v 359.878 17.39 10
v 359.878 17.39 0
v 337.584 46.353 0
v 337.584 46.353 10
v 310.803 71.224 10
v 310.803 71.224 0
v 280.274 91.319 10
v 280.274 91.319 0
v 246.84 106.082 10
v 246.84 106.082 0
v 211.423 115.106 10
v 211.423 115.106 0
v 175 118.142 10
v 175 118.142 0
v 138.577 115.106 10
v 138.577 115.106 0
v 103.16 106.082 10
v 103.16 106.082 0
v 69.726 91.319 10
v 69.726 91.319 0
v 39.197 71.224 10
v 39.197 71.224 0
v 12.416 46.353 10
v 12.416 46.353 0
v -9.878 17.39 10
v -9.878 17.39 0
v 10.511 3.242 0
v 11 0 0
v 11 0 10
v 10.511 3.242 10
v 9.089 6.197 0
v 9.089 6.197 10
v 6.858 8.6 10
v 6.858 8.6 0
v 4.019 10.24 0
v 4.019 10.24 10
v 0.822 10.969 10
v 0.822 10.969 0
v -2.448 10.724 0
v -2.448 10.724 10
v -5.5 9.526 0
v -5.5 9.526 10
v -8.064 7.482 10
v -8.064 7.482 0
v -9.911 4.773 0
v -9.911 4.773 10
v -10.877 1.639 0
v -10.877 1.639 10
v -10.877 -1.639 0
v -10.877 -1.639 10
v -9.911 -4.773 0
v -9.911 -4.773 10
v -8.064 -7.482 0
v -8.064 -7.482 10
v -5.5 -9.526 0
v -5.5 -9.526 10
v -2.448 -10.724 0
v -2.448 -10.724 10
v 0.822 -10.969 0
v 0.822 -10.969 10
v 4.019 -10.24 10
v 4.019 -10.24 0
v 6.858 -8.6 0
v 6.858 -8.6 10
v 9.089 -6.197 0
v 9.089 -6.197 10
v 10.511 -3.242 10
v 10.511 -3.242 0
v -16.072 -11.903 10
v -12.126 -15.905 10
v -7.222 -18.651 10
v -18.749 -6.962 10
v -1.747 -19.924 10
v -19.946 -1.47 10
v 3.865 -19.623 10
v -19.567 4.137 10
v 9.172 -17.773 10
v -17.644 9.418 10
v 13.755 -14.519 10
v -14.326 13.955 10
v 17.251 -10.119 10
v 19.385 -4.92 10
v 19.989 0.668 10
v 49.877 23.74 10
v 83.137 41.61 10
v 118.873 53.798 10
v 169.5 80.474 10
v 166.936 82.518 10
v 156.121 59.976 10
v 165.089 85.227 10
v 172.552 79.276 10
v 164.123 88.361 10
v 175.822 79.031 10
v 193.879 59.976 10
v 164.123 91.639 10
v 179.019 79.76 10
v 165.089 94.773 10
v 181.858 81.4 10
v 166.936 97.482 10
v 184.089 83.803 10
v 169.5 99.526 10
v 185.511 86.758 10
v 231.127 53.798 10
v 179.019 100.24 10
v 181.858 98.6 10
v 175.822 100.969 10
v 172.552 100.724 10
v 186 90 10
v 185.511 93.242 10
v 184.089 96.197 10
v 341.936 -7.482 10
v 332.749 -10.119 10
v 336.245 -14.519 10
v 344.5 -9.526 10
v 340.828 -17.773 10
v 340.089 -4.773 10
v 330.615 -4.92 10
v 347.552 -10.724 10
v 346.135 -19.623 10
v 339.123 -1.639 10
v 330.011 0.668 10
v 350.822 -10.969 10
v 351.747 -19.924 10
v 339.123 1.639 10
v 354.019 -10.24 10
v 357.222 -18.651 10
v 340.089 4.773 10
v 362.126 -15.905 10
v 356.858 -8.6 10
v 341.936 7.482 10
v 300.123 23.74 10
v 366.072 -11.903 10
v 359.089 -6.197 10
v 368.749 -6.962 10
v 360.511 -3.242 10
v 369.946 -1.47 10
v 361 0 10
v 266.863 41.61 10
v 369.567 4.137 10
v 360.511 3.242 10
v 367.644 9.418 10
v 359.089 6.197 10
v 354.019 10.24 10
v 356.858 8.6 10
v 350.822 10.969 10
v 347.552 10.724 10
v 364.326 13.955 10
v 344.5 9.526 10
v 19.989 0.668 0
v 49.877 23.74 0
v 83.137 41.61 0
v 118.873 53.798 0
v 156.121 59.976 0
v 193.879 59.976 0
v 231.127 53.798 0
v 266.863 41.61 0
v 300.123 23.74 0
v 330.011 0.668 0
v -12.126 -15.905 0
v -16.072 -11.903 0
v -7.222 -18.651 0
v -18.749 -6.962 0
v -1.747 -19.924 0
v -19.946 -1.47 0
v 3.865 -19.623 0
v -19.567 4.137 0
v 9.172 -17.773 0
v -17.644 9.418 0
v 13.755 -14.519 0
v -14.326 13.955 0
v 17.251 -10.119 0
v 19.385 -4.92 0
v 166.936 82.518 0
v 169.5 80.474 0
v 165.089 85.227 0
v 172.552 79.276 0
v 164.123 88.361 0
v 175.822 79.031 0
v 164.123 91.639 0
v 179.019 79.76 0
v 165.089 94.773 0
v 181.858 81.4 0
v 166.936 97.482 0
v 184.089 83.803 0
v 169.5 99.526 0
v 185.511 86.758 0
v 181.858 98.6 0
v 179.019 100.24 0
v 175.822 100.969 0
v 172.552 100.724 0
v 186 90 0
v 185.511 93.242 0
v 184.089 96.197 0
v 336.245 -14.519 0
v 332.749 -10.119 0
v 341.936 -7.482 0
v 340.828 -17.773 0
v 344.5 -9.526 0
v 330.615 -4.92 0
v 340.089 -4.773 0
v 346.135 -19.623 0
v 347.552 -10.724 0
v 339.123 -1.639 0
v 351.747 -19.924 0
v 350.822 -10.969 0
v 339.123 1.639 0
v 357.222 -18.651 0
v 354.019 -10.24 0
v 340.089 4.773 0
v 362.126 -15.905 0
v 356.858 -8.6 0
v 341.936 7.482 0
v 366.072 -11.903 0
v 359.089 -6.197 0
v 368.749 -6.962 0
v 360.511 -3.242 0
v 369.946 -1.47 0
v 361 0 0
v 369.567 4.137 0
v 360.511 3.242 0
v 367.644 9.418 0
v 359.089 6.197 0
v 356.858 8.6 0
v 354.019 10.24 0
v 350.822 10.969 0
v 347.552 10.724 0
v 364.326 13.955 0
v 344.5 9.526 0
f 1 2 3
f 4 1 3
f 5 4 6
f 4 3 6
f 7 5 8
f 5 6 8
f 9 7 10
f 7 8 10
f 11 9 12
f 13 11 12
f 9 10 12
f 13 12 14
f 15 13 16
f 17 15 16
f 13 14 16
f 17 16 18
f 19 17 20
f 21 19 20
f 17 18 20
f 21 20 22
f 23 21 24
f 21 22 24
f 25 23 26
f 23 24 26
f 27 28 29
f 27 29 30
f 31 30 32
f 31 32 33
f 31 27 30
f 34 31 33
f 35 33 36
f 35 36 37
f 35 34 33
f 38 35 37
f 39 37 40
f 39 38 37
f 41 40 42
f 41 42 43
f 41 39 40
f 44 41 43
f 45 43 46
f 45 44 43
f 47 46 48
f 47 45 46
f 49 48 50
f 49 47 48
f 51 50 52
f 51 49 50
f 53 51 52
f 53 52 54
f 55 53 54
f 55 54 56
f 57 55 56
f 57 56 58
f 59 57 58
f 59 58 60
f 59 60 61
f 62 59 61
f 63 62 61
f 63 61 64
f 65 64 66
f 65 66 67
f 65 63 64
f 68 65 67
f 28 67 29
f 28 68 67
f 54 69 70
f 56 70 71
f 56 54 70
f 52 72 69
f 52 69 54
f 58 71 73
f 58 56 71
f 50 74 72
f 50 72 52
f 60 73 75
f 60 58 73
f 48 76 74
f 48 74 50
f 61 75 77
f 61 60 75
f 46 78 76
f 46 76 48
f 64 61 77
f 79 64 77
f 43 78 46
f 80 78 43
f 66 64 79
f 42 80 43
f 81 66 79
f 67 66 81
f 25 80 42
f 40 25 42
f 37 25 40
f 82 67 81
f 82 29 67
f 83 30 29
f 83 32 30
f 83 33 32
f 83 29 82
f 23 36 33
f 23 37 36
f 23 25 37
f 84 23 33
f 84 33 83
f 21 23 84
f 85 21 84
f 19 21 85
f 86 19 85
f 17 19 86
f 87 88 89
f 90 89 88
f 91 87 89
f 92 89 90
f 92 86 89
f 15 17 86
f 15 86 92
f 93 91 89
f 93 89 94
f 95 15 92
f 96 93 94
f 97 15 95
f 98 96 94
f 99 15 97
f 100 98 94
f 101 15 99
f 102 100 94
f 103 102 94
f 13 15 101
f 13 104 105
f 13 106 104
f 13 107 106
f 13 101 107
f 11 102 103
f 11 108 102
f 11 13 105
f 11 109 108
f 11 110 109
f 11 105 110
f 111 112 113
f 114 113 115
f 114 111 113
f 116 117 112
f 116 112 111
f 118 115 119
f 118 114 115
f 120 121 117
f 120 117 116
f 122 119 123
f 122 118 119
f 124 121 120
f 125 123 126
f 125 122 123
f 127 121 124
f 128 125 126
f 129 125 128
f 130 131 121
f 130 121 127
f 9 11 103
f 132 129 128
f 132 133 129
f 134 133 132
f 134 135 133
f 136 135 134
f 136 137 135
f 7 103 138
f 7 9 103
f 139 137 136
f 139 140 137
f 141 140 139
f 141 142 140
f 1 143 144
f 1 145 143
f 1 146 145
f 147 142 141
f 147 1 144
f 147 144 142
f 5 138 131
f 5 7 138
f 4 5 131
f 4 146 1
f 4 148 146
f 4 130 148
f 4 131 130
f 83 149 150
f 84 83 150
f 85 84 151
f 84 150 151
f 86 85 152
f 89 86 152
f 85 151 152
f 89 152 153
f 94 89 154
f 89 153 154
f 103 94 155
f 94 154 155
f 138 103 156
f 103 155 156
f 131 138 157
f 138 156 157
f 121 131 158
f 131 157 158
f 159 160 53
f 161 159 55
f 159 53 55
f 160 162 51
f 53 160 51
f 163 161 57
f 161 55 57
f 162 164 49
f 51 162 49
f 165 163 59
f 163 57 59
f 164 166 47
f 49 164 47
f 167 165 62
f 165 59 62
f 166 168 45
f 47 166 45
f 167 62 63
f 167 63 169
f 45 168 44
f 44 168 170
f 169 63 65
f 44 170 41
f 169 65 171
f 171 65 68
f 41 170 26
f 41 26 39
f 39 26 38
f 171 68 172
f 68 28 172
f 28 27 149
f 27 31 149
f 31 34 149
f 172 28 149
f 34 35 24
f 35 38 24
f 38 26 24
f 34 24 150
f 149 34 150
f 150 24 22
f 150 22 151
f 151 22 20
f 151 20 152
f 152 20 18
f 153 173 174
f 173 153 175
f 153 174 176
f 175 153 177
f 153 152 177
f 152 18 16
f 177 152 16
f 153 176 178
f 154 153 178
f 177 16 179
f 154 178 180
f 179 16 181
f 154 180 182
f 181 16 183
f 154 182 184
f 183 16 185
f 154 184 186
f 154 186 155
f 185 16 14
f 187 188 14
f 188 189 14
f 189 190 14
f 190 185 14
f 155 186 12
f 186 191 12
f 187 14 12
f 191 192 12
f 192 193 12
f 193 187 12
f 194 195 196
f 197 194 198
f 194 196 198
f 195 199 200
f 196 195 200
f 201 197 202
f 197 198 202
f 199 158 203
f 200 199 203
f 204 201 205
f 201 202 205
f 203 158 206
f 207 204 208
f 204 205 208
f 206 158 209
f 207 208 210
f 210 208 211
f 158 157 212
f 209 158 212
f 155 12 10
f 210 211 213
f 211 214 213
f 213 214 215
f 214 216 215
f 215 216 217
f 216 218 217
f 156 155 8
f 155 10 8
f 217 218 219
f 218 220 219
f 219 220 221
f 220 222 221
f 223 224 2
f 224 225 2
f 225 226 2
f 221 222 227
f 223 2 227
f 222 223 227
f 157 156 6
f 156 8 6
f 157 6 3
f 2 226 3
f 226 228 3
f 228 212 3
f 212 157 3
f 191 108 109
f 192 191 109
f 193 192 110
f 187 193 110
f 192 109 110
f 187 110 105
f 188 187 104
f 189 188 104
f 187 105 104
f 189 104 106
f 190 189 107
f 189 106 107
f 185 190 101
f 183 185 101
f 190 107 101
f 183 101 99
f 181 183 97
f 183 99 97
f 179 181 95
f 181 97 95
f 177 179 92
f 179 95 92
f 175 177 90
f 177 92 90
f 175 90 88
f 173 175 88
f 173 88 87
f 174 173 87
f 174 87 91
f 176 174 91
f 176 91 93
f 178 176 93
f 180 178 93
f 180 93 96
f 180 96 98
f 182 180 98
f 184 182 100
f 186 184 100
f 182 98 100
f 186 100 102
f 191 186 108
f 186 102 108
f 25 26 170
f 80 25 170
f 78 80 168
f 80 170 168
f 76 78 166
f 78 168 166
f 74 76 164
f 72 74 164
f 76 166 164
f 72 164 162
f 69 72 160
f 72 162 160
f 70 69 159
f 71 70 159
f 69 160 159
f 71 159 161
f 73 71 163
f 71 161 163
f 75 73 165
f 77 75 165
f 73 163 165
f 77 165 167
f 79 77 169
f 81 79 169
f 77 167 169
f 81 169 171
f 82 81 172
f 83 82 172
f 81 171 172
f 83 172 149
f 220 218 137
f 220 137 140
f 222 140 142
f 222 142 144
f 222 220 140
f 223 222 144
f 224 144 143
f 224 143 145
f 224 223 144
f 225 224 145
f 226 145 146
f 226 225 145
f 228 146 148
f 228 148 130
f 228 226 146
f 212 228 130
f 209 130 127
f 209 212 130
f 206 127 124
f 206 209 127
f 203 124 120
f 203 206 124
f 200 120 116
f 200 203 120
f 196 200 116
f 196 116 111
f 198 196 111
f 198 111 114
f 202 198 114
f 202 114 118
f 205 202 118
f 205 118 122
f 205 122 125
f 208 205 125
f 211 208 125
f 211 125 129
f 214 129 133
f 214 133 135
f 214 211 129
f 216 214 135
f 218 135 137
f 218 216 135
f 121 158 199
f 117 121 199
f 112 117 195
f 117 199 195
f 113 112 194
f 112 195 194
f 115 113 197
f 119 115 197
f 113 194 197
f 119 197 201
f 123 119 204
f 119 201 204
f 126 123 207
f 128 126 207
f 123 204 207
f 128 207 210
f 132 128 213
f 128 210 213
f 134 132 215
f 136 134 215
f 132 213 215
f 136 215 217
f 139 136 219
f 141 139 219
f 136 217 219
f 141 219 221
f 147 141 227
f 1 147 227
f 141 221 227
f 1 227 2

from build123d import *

# Parameters (mm, degrees)
SKETCH1_R           = 11
BOSS_EXTRUDE1_DEPTH = 10
SKETCH3_R           = 11
CUT_EXTRUDE1_DEPTH  = 10


with BuildPart() as part:
    # Sketch1 → Boss-Extrude1 (new body)
    with BuildSketch(Plane.XY):
        with BuildLine():
            ThreePointArc((-9.87804878, 17.390346526), (-9.770615429, -17.450933332), (19.9888361, 0.668155187))
            ThreePointArc((19.9888361, 0.668155187), (175, 60.751884434), (330.0111639, 0.668155187))
            ThreePointArc((330.0111639, 0.668155187), (359.770615429, -17.450933332), (359.87804878, 17.390346526))
            ThreePointArc((359.87804878, 17.390346526), (175, 118.142256063), (-9.87804878, 17.390346526))
        make_face()
        Circle(SKETCH1_R, mode=Mode.SUBTRACT)
        with Locations((350, 0)):
            Circle(SKETCH1_R, mode=Mode.SUBTRACT)
    extrude(amount=BOSS_EXTRUDE1_DEPTH)

    # Sketch3 → Cut-Extrude1 (cut)
    with BuildSketch(Plane.XY.offset(10)):
        with Locations((175, 90)):
            Circle(SKETCH3_R)
    extrude(amount=-CUT_EXTRUDE1_DEPTH, mode=Mode.SUBTRACT)


solid = part.part
